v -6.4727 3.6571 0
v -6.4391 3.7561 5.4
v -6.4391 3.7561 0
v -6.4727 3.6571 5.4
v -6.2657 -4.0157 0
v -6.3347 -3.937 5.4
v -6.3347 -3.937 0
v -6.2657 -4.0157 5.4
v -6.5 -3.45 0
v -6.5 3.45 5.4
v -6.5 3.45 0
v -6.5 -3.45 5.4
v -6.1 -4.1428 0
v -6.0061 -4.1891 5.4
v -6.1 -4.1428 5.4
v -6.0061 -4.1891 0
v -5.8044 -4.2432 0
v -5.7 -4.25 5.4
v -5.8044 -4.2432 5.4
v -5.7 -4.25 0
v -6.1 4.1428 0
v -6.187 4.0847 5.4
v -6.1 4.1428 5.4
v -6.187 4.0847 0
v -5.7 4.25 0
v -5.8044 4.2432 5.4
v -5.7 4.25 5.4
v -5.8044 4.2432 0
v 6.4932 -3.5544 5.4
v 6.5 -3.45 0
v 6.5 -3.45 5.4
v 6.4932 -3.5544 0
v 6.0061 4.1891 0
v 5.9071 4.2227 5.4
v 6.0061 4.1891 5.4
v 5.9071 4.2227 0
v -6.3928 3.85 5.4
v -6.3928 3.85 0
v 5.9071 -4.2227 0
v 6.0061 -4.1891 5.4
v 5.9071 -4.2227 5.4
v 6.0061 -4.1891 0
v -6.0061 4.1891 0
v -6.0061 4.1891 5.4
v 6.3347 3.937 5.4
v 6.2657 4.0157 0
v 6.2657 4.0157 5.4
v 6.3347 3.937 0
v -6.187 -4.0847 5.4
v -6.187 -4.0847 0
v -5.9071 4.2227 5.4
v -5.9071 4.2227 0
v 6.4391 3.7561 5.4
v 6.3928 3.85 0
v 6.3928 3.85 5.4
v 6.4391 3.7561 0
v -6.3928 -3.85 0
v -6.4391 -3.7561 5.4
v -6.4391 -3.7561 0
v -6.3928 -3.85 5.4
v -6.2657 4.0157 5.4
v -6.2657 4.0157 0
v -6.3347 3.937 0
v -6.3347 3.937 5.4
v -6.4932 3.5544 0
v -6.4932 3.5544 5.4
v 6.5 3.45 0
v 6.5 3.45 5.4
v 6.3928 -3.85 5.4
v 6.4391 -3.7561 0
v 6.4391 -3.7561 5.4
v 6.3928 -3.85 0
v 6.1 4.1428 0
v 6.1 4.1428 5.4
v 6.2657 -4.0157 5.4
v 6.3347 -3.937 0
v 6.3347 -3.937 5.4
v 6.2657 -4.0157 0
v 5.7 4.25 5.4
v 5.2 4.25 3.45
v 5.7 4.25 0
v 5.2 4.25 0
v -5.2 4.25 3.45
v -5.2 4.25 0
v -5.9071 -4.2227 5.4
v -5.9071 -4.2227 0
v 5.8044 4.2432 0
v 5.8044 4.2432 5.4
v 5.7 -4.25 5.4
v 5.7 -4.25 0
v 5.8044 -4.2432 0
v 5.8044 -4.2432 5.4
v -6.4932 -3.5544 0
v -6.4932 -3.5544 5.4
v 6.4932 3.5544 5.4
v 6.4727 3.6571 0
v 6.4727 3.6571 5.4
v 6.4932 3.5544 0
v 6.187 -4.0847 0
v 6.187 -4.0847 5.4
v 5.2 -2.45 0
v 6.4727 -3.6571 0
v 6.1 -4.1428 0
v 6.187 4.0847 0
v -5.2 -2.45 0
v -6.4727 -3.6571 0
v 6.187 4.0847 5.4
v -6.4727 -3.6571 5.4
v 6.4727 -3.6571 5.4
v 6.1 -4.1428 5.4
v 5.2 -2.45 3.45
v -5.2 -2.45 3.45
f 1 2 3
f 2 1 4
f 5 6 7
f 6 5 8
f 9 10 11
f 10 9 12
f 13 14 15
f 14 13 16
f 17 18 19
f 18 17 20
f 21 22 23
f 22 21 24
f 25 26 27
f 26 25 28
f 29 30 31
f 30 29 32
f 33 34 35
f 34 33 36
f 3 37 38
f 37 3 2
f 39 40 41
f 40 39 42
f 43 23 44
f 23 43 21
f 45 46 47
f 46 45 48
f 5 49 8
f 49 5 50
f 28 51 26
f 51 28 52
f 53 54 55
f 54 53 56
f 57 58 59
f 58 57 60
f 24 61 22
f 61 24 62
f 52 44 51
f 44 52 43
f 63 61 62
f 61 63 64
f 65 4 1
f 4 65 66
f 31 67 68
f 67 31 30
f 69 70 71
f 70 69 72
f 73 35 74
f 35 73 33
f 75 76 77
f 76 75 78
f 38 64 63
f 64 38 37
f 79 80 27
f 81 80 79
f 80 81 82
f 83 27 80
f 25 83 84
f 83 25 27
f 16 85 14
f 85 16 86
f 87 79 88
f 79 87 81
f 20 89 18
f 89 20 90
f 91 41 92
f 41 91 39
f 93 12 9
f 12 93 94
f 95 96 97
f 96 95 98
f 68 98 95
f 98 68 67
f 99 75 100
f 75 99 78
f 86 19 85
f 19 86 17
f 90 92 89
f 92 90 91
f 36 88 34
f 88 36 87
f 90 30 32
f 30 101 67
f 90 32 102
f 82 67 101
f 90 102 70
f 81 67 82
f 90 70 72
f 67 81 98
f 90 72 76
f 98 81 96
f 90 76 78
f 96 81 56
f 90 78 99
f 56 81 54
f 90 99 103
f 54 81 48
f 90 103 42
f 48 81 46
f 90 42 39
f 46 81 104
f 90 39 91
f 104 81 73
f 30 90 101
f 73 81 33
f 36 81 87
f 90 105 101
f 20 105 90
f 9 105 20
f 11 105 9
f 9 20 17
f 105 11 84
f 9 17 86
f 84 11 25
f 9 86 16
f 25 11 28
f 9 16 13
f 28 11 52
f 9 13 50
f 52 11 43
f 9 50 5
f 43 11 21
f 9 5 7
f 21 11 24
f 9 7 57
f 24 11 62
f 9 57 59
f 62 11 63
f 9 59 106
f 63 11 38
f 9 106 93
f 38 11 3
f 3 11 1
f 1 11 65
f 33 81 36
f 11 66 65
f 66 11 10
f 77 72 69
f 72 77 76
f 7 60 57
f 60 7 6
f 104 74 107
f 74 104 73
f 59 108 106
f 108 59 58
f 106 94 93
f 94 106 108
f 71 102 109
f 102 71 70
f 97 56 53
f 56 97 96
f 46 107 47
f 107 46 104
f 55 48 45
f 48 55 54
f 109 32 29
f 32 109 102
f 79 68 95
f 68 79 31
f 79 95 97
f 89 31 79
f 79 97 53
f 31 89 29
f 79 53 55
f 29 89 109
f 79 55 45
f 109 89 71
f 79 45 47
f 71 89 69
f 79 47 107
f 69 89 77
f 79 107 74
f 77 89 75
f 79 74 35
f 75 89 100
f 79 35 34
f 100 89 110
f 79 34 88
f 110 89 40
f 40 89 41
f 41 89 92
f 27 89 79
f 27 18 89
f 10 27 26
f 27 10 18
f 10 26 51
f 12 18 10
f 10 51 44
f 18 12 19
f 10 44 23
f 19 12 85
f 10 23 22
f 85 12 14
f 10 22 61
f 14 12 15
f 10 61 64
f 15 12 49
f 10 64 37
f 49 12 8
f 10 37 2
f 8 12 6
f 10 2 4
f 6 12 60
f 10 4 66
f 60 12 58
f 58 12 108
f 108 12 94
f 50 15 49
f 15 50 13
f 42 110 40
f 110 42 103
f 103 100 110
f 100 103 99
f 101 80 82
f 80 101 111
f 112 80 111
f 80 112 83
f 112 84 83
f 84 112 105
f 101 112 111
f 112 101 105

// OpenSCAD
// Tiny removable cap to hide the anti-lift tab and its screw.
// Designed for the tab in 10.1_mount-landscape-with-anti-lift-tab.scad:
// tab size 10 x 5.5 x 2 mm, with a 1.5 mm screw clearance hole.
// Print in black filament. Open underside slides over the tab after fastening.

$fn = 48;

// Fit allowances are intentionally modest; adjust if your printer runs tight.
cap_width  = 13.0;   // X overall
cap_depth  = 8.5;    // Y overall
cap_height = 5.4;    // Z overall
wall       = 1.2;
roof       = 0;
corner_r   = 0.8;

inner_width  = 10.4; // 0.2 mm clearance per side around 10 mm tab
inner_depth  = 7.3;  // 0.2 mm clearance side around 5.5 mm tab
inner_height = 7; // open bottom; cavity extends to underside of roof

module rounded_box(x, y, z, r) {
    // Rounded outer corners with flat top and bottom.
    hull() {
        for (px = [-x/2+r, x/2-r])
            for (py = [-y/2+r, y/2-r])
                translate([px, py, 0]) cylinder(h=z, r=r);
    }
}

color("black")
difference() {
    rounded_box(cap_width, cap_depth, cap_height, corner_r);
    // Open underside; cavity is centred and leaves a 1.2 mm roof.
    translate([0, 1.2, -0.1])
        cube([inner_width, inner_depth, inner_height + 0.1], center=true);
}
